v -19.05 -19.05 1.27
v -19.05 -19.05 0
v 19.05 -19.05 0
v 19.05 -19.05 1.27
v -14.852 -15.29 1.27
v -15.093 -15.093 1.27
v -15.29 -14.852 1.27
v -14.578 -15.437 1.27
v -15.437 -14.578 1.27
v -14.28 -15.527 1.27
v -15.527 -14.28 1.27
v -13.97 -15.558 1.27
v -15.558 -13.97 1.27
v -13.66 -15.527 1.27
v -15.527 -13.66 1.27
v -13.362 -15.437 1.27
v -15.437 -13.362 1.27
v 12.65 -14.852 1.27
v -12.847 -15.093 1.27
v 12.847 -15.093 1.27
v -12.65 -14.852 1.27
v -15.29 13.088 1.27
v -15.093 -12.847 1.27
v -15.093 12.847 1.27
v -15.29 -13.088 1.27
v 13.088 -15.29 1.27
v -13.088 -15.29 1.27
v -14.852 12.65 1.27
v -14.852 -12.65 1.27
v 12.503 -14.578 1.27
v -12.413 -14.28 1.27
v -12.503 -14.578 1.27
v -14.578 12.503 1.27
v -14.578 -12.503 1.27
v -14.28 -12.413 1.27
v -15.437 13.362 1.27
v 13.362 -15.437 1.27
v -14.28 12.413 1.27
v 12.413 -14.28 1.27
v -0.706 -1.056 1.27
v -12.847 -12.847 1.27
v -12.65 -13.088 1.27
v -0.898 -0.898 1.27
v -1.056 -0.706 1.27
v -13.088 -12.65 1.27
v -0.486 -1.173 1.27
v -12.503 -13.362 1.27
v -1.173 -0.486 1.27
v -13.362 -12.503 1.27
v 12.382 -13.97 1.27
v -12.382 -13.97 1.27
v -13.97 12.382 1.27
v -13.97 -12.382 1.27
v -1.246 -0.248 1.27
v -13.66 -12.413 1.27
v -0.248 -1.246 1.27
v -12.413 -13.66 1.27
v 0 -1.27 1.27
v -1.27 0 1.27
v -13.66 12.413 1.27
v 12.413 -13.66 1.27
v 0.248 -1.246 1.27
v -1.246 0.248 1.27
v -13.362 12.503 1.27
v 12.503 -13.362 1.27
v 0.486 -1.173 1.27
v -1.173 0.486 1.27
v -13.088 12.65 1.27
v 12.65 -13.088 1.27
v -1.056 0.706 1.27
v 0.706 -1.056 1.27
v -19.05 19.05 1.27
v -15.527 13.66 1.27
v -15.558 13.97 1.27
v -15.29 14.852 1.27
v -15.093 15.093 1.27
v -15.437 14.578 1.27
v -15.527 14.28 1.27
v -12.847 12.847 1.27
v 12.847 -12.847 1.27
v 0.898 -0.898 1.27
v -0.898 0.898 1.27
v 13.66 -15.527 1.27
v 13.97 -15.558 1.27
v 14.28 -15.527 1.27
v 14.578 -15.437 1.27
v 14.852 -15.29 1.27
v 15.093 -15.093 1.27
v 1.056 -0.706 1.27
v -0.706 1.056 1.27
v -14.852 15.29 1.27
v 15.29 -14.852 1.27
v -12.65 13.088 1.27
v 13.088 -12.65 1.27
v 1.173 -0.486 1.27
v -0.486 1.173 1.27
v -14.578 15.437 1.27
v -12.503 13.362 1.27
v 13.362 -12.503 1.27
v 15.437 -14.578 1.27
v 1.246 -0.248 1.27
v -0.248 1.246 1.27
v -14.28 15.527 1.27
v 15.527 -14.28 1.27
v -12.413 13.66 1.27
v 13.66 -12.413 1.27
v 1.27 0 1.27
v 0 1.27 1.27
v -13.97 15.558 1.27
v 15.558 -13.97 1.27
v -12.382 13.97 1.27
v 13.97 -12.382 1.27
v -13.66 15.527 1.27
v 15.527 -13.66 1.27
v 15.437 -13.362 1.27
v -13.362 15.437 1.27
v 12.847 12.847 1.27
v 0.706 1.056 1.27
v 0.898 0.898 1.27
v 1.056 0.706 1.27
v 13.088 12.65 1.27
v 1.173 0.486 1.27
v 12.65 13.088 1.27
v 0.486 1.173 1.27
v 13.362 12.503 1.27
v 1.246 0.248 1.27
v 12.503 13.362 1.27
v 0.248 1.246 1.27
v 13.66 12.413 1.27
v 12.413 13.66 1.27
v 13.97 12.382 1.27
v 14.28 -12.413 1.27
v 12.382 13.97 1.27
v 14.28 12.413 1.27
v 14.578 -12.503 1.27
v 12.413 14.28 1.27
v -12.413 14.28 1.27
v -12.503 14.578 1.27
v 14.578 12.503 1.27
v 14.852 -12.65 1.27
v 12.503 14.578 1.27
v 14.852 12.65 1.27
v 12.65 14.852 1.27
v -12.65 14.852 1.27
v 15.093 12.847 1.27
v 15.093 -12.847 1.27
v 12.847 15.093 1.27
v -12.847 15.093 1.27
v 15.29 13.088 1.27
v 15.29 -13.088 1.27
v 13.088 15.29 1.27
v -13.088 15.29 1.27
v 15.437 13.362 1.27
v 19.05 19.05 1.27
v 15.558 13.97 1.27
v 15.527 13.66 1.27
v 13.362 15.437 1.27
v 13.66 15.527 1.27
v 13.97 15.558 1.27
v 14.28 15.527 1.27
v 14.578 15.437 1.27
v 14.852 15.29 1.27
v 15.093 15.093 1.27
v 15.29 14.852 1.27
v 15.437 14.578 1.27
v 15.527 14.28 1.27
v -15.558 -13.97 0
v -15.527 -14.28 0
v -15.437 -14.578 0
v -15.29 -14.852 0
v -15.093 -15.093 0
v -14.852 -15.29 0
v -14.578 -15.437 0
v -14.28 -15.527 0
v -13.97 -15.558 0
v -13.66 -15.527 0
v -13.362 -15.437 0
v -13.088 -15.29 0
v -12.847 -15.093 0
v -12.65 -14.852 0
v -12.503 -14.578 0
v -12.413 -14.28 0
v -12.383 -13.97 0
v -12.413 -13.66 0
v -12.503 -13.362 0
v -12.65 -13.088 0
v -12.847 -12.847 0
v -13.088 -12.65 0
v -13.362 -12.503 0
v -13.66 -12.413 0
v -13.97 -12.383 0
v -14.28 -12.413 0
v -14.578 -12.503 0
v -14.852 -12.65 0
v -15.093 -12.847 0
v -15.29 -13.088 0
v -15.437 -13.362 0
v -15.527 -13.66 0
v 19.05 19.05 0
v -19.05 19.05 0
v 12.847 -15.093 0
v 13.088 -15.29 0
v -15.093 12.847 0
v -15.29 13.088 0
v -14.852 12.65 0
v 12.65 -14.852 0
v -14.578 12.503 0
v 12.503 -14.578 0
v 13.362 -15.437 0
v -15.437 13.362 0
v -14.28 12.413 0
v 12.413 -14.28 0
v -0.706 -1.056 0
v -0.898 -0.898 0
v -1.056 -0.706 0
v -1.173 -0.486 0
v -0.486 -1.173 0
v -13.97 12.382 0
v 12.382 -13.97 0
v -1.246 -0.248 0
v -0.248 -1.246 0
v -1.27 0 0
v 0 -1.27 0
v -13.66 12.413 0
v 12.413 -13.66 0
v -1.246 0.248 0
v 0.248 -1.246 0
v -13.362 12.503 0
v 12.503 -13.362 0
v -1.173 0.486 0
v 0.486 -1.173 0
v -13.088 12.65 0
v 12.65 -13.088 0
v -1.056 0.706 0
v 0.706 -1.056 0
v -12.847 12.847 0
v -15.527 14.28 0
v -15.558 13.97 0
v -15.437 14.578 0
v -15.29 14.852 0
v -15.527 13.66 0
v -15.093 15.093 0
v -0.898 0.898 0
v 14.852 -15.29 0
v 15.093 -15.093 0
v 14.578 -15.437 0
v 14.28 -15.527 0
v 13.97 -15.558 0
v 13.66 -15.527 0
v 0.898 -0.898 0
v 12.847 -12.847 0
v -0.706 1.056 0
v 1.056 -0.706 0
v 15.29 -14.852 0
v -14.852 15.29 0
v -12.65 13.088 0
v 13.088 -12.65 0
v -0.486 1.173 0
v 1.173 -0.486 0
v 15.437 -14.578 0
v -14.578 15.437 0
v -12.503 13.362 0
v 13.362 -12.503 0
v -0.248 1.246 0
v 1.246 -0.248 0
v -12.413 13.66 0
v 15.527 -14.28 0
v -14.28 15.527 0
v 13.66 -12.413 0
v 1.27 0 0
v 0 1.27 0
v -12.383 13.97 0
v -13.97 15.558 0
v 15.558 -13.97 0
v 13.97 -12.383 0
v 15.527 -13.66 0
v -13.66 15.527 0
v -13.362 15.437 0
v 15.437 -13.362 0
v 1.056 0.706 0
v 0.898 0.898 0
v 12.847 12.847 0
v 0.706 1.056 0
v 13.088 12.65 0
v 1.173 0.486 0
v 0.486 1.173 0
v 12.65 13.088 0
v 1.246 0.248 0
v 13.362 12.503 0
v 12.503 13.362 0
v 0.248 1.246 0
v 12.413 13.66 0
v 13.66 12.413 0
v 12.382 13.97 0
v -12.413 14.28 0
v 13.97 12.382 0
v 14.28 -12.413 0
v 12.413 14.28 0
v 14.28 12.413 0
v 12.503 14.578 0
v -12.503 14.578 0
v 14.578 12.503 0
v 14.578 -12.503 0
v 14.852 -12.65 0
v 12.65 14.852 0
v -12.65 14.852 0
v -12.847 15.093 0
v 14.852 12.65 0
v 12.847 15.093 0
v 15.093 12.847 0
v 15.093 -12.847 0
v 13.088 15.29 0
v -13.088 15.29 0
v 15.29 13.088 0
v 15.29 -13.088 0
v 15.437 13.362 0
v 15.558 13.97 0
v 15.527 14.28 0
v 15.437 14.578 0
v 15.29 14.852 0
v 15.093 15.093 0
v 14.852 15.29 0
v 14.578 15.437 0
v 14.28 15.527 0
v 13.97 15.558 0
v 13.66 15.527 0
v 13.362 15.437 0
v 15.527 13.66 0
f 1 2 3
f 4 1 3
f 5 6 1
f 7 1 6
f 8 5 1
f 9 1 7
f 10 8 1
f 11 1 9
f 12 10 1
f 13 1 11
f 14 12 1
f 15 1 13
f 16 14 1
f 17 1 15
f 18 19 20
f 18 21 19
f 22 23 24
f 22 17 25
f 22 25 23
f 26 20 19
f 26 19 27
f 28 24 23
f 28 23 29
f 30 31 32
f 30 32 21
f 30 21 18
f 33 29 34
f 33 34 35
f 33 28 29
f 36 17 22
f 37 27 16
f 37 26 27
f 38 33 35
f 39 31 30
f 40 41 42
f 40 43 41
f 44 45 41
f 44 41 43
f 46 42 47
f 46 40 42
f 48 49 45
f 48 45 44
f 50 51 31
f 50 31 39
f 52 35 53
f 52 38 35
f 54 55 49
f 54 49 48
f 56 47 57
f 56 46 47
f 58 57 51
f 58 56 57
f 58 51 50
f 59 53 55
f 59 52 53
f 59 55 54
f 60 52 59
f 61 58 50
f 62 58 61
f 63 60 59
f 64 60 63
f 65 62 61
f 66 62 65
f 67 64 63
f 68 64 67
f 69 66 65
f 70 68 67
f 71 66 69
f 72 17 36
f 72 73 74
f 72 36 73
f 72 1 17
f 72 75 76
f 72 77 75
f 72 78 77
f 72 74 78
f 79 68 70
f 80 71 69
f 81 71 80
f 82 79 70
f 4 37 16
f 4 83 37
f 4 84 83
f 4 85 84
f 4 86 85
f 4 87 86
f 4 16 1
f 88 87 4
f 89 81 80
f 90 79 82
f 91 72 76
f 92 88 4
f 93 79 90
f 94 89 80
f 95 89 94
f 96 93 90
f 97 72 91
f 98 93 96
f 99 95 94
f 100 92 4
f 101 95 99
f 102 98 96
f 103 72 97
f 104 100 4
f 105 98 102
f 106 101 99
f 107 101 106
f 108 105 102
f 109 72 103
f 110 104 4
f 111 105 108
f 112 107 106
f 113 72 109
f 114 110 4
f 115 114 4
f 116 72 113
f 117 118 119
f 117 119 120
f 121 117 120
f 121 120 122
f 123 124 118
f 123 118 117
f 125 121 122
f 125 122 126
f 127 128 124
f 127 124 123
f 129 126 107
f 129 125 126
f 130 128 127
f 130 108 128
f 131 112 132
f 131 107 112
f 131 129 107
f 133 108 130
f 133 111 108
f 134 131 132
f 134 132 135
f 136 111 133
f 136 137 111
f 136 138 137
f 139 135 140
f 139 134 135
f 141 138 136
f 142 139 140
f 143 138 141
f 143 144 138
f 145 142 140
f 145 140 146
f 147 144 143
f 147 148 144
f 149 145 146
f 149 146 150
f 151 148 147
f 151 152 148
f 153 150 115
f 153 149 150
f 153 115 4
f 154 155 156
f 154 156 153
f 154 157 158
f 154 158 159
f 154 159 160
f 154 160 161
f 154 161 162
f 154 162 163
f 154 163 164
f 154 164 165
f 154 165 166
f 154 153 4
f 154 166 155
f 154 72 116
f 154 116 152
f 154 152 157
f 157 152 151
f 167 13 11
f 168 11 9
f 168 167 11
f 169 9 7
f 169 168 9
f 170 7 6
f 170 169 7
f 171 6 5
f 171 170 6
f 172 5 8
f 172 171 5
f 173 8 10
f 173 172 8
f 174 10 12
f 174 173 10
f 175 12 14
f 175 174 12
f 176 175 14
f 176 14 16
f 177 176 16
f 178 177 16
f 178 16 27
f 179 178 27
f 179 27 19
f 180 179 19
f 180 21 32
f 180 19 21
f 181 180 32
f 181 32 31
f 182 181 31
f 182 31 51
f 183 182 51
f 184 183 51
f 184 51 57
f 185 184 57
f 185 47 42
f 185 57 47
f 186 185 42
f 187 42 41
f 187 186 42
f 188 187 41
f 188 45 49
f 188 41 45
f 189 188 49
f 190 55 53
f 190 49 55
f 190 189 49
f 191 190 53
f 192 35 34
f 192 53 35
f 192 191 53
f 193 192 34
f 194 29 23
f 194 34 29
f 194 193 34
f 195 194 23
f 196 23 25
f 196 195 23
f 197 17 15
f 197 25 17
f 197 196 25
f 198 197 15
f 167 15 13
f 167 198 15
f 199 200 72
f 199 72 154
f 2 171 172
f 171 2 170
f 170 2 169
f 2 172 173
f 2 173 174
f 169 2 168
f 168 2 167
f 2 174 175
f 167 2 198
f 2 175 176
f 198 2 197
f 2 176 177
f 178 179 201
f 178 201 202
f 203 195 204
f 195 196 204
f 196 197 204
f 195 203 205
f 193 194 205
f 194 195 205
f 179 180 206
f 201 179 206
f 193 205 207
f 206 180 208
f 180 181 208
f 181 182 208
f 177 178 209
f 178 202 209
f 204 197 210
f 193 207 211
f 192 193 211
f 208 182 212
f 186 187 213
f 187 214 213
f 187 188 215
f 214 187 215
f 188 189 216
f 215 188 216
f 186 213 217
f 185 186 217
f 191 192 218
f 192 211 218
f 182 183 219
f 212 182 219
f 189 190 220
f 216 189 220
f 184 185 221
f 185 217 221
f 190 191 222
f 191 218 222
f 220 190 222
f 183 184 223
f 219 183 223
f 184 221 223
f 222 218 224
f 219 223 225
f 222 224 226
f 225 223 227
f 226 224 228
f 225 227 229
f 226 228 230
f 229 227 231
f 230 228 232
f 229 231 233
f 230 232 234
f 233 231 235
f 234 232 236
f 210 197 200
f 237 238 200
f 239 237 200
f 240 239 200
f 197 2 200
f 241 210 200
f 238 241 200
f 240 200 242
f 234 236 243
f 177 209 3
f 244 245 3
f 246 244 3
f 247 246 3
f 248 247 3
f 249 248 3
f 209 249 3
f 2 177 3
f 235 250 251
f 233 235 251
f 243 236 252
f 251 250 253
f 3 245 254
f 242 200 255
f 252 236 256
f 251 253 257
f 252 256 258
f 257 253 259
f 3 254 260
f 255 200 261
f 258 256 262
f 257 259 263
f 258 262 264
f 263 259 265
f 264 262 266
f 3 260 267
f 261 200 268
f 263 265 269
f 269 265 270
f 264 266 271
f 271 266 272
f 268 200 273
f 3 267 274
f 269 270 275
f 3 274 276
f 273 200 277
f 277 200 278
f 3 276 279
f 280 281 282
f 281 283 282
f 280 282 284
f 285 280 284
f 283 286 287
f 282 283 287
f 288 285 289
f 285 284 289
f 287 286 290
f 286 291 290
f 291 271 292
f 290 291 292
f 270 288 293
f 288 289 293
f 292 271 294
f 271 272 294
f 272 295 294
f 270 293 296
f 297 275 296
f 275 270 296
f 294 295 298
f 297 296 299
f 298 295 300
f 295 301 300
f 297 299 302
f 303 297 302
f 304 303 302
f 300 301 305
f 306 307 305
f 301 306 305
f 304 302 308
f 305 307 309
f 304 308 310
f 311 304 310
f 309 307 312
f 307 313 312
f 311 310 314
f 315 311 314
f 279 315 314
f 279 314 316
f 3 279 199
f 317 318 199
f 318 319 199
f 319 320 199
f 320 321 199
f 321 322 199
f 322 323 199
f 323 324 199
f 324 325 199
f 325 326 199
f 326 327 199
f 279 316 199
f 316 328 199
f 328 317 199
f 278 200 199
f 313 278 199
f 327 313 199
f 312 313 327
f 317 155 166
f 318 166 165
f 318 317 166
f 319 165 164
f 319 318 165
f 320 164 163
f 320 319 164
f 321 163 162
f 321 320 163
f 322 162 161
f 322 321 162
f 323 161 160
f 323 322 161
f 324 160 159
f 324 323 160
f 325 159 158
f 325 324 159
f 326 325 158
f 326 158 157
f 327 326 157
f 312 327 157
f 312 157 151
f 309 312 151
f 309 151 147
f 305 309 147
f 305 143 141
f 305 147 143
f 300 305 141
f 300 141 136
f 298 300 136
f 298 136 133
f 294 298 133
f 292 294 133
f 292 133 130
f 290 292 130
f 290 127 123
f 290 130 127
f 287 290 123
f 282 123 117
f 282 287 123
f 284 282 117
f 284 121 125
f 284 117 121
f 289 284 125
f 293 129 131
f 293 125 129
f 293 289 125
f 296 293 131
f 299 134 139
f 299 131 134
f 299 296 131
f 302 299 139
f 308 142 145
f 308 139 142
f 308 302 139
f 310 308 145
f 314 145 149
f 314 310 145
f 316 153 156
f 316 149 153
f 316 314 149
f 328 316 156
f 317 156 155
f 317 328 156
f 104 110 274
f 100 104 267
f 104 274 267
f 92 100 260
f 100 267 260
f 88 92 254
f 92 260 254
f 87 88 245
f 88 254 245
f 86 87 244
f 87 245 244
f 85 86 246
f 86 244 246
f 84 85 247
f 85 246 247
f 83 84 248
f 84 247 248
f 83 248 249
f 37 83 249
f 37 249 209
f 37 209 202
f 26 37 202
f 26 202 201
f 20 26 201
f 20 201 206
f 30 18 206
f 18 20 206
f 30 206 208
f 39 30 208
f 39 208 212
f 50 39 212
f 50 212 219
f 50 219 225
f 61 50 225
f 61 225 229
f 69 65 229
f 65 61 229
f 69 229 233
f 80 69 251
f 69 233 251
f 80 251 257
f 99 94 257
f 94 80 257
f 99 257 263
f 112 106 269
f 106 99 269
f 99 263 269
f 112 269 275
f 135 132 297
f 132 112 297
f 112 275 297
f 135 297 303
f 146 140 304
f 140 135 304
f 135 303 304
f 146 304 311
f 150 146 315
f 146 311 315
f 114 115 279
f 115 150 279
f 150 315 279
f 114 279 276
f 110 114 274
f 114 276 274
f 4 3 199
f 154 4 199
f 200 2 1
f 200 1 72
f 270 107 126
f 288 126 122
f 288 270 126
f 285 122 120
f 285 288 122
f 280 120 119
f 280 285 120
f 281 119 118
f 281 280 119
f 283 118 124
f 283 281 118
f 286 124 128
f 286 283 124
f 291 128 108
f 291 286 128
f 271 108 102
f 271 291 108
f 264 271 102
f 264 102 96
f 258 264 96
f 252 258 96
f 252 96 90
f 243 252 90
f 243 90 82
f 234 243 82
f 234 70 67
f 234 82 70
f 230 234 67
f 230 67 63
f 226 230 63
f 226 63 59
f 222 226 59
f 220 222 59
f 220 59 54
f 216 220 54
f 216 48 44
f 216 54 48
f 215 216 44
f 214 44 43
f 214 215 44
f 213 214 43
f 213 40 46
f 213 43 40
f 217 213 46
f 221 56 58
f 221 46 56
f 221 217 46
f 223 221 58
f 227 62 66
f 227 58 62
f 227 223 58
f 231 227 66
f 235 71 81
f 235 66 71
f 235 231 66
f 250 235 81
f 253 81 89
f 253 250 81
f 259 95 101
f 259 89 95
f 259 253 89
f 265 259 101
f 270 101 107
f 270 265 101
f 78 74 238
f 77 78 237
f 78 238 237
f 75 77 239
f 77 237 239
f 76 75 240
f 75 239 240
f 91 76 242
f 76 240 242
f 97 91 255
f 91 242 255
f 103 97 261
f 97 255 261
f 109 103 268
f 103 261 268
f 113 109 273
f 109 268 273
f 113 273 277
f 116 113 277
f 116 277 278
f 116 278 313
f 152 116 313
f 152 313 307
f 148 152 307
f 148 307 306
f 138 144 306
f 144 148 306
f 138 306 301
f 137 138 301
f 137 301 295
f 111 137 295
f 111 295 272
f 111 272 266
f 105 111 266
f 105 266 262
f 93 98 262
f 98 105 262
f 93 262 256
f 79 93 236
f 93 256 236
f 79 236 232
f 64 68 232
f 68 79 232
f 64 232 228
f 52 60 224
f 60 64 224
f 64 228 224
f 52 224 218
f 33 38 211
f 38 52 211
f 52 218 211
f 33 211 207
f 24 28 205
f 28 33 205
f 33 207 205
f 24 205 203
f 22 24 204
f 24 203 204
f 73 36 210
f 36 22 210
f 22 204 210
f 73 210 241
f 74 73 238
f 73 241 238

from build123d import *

# Parameters (mm, degrees)
F0_W     = 38.1
F0_H     = 38.1
F1_DEPTH = 1.27
F2_R     = 1.27
F3_DEPTH = 25.4
F4_R     = 1.5875
F5_DEPTH = 25.4


with BuildPart() as f1:
    # F0 (on Top) → F1 (new body)
    with BuildSketch(Plane.XY):
        Rectangle(F0_W, F0_H)
    extrude(amount=F1_DEPTH)

    # F2 (on Top) → F3 (cut)
    with BuildSketch(Plane.XY):
        Circle(F2_R)
    extrude(amount=F3_DEPTH, mode=Mode.SUBTRACT)

    # F4 (on Top) → F5 (cut)
    with BuildSketch(Plane.XY):
        with Locations((13.97, 13.97)):
            Circle(F4_R)
    extrude(amount=F5_DEPTH, mode=Mode.SUBTRACT)

    # F6: F1 across plane


with BuildPart() as f1_1:
    add(f1.part)
    add(f1.part.mirror(Plane.YZ), mode=Mode.INTERSECT)

    # F7: F1 across plane


with BuildPart() as f1_2:
    add(f1_1.part)
    add(f1_1.part.mirror(Plane.XZ), mode=Mode.INTERSECT)


solid = f1_2.part
